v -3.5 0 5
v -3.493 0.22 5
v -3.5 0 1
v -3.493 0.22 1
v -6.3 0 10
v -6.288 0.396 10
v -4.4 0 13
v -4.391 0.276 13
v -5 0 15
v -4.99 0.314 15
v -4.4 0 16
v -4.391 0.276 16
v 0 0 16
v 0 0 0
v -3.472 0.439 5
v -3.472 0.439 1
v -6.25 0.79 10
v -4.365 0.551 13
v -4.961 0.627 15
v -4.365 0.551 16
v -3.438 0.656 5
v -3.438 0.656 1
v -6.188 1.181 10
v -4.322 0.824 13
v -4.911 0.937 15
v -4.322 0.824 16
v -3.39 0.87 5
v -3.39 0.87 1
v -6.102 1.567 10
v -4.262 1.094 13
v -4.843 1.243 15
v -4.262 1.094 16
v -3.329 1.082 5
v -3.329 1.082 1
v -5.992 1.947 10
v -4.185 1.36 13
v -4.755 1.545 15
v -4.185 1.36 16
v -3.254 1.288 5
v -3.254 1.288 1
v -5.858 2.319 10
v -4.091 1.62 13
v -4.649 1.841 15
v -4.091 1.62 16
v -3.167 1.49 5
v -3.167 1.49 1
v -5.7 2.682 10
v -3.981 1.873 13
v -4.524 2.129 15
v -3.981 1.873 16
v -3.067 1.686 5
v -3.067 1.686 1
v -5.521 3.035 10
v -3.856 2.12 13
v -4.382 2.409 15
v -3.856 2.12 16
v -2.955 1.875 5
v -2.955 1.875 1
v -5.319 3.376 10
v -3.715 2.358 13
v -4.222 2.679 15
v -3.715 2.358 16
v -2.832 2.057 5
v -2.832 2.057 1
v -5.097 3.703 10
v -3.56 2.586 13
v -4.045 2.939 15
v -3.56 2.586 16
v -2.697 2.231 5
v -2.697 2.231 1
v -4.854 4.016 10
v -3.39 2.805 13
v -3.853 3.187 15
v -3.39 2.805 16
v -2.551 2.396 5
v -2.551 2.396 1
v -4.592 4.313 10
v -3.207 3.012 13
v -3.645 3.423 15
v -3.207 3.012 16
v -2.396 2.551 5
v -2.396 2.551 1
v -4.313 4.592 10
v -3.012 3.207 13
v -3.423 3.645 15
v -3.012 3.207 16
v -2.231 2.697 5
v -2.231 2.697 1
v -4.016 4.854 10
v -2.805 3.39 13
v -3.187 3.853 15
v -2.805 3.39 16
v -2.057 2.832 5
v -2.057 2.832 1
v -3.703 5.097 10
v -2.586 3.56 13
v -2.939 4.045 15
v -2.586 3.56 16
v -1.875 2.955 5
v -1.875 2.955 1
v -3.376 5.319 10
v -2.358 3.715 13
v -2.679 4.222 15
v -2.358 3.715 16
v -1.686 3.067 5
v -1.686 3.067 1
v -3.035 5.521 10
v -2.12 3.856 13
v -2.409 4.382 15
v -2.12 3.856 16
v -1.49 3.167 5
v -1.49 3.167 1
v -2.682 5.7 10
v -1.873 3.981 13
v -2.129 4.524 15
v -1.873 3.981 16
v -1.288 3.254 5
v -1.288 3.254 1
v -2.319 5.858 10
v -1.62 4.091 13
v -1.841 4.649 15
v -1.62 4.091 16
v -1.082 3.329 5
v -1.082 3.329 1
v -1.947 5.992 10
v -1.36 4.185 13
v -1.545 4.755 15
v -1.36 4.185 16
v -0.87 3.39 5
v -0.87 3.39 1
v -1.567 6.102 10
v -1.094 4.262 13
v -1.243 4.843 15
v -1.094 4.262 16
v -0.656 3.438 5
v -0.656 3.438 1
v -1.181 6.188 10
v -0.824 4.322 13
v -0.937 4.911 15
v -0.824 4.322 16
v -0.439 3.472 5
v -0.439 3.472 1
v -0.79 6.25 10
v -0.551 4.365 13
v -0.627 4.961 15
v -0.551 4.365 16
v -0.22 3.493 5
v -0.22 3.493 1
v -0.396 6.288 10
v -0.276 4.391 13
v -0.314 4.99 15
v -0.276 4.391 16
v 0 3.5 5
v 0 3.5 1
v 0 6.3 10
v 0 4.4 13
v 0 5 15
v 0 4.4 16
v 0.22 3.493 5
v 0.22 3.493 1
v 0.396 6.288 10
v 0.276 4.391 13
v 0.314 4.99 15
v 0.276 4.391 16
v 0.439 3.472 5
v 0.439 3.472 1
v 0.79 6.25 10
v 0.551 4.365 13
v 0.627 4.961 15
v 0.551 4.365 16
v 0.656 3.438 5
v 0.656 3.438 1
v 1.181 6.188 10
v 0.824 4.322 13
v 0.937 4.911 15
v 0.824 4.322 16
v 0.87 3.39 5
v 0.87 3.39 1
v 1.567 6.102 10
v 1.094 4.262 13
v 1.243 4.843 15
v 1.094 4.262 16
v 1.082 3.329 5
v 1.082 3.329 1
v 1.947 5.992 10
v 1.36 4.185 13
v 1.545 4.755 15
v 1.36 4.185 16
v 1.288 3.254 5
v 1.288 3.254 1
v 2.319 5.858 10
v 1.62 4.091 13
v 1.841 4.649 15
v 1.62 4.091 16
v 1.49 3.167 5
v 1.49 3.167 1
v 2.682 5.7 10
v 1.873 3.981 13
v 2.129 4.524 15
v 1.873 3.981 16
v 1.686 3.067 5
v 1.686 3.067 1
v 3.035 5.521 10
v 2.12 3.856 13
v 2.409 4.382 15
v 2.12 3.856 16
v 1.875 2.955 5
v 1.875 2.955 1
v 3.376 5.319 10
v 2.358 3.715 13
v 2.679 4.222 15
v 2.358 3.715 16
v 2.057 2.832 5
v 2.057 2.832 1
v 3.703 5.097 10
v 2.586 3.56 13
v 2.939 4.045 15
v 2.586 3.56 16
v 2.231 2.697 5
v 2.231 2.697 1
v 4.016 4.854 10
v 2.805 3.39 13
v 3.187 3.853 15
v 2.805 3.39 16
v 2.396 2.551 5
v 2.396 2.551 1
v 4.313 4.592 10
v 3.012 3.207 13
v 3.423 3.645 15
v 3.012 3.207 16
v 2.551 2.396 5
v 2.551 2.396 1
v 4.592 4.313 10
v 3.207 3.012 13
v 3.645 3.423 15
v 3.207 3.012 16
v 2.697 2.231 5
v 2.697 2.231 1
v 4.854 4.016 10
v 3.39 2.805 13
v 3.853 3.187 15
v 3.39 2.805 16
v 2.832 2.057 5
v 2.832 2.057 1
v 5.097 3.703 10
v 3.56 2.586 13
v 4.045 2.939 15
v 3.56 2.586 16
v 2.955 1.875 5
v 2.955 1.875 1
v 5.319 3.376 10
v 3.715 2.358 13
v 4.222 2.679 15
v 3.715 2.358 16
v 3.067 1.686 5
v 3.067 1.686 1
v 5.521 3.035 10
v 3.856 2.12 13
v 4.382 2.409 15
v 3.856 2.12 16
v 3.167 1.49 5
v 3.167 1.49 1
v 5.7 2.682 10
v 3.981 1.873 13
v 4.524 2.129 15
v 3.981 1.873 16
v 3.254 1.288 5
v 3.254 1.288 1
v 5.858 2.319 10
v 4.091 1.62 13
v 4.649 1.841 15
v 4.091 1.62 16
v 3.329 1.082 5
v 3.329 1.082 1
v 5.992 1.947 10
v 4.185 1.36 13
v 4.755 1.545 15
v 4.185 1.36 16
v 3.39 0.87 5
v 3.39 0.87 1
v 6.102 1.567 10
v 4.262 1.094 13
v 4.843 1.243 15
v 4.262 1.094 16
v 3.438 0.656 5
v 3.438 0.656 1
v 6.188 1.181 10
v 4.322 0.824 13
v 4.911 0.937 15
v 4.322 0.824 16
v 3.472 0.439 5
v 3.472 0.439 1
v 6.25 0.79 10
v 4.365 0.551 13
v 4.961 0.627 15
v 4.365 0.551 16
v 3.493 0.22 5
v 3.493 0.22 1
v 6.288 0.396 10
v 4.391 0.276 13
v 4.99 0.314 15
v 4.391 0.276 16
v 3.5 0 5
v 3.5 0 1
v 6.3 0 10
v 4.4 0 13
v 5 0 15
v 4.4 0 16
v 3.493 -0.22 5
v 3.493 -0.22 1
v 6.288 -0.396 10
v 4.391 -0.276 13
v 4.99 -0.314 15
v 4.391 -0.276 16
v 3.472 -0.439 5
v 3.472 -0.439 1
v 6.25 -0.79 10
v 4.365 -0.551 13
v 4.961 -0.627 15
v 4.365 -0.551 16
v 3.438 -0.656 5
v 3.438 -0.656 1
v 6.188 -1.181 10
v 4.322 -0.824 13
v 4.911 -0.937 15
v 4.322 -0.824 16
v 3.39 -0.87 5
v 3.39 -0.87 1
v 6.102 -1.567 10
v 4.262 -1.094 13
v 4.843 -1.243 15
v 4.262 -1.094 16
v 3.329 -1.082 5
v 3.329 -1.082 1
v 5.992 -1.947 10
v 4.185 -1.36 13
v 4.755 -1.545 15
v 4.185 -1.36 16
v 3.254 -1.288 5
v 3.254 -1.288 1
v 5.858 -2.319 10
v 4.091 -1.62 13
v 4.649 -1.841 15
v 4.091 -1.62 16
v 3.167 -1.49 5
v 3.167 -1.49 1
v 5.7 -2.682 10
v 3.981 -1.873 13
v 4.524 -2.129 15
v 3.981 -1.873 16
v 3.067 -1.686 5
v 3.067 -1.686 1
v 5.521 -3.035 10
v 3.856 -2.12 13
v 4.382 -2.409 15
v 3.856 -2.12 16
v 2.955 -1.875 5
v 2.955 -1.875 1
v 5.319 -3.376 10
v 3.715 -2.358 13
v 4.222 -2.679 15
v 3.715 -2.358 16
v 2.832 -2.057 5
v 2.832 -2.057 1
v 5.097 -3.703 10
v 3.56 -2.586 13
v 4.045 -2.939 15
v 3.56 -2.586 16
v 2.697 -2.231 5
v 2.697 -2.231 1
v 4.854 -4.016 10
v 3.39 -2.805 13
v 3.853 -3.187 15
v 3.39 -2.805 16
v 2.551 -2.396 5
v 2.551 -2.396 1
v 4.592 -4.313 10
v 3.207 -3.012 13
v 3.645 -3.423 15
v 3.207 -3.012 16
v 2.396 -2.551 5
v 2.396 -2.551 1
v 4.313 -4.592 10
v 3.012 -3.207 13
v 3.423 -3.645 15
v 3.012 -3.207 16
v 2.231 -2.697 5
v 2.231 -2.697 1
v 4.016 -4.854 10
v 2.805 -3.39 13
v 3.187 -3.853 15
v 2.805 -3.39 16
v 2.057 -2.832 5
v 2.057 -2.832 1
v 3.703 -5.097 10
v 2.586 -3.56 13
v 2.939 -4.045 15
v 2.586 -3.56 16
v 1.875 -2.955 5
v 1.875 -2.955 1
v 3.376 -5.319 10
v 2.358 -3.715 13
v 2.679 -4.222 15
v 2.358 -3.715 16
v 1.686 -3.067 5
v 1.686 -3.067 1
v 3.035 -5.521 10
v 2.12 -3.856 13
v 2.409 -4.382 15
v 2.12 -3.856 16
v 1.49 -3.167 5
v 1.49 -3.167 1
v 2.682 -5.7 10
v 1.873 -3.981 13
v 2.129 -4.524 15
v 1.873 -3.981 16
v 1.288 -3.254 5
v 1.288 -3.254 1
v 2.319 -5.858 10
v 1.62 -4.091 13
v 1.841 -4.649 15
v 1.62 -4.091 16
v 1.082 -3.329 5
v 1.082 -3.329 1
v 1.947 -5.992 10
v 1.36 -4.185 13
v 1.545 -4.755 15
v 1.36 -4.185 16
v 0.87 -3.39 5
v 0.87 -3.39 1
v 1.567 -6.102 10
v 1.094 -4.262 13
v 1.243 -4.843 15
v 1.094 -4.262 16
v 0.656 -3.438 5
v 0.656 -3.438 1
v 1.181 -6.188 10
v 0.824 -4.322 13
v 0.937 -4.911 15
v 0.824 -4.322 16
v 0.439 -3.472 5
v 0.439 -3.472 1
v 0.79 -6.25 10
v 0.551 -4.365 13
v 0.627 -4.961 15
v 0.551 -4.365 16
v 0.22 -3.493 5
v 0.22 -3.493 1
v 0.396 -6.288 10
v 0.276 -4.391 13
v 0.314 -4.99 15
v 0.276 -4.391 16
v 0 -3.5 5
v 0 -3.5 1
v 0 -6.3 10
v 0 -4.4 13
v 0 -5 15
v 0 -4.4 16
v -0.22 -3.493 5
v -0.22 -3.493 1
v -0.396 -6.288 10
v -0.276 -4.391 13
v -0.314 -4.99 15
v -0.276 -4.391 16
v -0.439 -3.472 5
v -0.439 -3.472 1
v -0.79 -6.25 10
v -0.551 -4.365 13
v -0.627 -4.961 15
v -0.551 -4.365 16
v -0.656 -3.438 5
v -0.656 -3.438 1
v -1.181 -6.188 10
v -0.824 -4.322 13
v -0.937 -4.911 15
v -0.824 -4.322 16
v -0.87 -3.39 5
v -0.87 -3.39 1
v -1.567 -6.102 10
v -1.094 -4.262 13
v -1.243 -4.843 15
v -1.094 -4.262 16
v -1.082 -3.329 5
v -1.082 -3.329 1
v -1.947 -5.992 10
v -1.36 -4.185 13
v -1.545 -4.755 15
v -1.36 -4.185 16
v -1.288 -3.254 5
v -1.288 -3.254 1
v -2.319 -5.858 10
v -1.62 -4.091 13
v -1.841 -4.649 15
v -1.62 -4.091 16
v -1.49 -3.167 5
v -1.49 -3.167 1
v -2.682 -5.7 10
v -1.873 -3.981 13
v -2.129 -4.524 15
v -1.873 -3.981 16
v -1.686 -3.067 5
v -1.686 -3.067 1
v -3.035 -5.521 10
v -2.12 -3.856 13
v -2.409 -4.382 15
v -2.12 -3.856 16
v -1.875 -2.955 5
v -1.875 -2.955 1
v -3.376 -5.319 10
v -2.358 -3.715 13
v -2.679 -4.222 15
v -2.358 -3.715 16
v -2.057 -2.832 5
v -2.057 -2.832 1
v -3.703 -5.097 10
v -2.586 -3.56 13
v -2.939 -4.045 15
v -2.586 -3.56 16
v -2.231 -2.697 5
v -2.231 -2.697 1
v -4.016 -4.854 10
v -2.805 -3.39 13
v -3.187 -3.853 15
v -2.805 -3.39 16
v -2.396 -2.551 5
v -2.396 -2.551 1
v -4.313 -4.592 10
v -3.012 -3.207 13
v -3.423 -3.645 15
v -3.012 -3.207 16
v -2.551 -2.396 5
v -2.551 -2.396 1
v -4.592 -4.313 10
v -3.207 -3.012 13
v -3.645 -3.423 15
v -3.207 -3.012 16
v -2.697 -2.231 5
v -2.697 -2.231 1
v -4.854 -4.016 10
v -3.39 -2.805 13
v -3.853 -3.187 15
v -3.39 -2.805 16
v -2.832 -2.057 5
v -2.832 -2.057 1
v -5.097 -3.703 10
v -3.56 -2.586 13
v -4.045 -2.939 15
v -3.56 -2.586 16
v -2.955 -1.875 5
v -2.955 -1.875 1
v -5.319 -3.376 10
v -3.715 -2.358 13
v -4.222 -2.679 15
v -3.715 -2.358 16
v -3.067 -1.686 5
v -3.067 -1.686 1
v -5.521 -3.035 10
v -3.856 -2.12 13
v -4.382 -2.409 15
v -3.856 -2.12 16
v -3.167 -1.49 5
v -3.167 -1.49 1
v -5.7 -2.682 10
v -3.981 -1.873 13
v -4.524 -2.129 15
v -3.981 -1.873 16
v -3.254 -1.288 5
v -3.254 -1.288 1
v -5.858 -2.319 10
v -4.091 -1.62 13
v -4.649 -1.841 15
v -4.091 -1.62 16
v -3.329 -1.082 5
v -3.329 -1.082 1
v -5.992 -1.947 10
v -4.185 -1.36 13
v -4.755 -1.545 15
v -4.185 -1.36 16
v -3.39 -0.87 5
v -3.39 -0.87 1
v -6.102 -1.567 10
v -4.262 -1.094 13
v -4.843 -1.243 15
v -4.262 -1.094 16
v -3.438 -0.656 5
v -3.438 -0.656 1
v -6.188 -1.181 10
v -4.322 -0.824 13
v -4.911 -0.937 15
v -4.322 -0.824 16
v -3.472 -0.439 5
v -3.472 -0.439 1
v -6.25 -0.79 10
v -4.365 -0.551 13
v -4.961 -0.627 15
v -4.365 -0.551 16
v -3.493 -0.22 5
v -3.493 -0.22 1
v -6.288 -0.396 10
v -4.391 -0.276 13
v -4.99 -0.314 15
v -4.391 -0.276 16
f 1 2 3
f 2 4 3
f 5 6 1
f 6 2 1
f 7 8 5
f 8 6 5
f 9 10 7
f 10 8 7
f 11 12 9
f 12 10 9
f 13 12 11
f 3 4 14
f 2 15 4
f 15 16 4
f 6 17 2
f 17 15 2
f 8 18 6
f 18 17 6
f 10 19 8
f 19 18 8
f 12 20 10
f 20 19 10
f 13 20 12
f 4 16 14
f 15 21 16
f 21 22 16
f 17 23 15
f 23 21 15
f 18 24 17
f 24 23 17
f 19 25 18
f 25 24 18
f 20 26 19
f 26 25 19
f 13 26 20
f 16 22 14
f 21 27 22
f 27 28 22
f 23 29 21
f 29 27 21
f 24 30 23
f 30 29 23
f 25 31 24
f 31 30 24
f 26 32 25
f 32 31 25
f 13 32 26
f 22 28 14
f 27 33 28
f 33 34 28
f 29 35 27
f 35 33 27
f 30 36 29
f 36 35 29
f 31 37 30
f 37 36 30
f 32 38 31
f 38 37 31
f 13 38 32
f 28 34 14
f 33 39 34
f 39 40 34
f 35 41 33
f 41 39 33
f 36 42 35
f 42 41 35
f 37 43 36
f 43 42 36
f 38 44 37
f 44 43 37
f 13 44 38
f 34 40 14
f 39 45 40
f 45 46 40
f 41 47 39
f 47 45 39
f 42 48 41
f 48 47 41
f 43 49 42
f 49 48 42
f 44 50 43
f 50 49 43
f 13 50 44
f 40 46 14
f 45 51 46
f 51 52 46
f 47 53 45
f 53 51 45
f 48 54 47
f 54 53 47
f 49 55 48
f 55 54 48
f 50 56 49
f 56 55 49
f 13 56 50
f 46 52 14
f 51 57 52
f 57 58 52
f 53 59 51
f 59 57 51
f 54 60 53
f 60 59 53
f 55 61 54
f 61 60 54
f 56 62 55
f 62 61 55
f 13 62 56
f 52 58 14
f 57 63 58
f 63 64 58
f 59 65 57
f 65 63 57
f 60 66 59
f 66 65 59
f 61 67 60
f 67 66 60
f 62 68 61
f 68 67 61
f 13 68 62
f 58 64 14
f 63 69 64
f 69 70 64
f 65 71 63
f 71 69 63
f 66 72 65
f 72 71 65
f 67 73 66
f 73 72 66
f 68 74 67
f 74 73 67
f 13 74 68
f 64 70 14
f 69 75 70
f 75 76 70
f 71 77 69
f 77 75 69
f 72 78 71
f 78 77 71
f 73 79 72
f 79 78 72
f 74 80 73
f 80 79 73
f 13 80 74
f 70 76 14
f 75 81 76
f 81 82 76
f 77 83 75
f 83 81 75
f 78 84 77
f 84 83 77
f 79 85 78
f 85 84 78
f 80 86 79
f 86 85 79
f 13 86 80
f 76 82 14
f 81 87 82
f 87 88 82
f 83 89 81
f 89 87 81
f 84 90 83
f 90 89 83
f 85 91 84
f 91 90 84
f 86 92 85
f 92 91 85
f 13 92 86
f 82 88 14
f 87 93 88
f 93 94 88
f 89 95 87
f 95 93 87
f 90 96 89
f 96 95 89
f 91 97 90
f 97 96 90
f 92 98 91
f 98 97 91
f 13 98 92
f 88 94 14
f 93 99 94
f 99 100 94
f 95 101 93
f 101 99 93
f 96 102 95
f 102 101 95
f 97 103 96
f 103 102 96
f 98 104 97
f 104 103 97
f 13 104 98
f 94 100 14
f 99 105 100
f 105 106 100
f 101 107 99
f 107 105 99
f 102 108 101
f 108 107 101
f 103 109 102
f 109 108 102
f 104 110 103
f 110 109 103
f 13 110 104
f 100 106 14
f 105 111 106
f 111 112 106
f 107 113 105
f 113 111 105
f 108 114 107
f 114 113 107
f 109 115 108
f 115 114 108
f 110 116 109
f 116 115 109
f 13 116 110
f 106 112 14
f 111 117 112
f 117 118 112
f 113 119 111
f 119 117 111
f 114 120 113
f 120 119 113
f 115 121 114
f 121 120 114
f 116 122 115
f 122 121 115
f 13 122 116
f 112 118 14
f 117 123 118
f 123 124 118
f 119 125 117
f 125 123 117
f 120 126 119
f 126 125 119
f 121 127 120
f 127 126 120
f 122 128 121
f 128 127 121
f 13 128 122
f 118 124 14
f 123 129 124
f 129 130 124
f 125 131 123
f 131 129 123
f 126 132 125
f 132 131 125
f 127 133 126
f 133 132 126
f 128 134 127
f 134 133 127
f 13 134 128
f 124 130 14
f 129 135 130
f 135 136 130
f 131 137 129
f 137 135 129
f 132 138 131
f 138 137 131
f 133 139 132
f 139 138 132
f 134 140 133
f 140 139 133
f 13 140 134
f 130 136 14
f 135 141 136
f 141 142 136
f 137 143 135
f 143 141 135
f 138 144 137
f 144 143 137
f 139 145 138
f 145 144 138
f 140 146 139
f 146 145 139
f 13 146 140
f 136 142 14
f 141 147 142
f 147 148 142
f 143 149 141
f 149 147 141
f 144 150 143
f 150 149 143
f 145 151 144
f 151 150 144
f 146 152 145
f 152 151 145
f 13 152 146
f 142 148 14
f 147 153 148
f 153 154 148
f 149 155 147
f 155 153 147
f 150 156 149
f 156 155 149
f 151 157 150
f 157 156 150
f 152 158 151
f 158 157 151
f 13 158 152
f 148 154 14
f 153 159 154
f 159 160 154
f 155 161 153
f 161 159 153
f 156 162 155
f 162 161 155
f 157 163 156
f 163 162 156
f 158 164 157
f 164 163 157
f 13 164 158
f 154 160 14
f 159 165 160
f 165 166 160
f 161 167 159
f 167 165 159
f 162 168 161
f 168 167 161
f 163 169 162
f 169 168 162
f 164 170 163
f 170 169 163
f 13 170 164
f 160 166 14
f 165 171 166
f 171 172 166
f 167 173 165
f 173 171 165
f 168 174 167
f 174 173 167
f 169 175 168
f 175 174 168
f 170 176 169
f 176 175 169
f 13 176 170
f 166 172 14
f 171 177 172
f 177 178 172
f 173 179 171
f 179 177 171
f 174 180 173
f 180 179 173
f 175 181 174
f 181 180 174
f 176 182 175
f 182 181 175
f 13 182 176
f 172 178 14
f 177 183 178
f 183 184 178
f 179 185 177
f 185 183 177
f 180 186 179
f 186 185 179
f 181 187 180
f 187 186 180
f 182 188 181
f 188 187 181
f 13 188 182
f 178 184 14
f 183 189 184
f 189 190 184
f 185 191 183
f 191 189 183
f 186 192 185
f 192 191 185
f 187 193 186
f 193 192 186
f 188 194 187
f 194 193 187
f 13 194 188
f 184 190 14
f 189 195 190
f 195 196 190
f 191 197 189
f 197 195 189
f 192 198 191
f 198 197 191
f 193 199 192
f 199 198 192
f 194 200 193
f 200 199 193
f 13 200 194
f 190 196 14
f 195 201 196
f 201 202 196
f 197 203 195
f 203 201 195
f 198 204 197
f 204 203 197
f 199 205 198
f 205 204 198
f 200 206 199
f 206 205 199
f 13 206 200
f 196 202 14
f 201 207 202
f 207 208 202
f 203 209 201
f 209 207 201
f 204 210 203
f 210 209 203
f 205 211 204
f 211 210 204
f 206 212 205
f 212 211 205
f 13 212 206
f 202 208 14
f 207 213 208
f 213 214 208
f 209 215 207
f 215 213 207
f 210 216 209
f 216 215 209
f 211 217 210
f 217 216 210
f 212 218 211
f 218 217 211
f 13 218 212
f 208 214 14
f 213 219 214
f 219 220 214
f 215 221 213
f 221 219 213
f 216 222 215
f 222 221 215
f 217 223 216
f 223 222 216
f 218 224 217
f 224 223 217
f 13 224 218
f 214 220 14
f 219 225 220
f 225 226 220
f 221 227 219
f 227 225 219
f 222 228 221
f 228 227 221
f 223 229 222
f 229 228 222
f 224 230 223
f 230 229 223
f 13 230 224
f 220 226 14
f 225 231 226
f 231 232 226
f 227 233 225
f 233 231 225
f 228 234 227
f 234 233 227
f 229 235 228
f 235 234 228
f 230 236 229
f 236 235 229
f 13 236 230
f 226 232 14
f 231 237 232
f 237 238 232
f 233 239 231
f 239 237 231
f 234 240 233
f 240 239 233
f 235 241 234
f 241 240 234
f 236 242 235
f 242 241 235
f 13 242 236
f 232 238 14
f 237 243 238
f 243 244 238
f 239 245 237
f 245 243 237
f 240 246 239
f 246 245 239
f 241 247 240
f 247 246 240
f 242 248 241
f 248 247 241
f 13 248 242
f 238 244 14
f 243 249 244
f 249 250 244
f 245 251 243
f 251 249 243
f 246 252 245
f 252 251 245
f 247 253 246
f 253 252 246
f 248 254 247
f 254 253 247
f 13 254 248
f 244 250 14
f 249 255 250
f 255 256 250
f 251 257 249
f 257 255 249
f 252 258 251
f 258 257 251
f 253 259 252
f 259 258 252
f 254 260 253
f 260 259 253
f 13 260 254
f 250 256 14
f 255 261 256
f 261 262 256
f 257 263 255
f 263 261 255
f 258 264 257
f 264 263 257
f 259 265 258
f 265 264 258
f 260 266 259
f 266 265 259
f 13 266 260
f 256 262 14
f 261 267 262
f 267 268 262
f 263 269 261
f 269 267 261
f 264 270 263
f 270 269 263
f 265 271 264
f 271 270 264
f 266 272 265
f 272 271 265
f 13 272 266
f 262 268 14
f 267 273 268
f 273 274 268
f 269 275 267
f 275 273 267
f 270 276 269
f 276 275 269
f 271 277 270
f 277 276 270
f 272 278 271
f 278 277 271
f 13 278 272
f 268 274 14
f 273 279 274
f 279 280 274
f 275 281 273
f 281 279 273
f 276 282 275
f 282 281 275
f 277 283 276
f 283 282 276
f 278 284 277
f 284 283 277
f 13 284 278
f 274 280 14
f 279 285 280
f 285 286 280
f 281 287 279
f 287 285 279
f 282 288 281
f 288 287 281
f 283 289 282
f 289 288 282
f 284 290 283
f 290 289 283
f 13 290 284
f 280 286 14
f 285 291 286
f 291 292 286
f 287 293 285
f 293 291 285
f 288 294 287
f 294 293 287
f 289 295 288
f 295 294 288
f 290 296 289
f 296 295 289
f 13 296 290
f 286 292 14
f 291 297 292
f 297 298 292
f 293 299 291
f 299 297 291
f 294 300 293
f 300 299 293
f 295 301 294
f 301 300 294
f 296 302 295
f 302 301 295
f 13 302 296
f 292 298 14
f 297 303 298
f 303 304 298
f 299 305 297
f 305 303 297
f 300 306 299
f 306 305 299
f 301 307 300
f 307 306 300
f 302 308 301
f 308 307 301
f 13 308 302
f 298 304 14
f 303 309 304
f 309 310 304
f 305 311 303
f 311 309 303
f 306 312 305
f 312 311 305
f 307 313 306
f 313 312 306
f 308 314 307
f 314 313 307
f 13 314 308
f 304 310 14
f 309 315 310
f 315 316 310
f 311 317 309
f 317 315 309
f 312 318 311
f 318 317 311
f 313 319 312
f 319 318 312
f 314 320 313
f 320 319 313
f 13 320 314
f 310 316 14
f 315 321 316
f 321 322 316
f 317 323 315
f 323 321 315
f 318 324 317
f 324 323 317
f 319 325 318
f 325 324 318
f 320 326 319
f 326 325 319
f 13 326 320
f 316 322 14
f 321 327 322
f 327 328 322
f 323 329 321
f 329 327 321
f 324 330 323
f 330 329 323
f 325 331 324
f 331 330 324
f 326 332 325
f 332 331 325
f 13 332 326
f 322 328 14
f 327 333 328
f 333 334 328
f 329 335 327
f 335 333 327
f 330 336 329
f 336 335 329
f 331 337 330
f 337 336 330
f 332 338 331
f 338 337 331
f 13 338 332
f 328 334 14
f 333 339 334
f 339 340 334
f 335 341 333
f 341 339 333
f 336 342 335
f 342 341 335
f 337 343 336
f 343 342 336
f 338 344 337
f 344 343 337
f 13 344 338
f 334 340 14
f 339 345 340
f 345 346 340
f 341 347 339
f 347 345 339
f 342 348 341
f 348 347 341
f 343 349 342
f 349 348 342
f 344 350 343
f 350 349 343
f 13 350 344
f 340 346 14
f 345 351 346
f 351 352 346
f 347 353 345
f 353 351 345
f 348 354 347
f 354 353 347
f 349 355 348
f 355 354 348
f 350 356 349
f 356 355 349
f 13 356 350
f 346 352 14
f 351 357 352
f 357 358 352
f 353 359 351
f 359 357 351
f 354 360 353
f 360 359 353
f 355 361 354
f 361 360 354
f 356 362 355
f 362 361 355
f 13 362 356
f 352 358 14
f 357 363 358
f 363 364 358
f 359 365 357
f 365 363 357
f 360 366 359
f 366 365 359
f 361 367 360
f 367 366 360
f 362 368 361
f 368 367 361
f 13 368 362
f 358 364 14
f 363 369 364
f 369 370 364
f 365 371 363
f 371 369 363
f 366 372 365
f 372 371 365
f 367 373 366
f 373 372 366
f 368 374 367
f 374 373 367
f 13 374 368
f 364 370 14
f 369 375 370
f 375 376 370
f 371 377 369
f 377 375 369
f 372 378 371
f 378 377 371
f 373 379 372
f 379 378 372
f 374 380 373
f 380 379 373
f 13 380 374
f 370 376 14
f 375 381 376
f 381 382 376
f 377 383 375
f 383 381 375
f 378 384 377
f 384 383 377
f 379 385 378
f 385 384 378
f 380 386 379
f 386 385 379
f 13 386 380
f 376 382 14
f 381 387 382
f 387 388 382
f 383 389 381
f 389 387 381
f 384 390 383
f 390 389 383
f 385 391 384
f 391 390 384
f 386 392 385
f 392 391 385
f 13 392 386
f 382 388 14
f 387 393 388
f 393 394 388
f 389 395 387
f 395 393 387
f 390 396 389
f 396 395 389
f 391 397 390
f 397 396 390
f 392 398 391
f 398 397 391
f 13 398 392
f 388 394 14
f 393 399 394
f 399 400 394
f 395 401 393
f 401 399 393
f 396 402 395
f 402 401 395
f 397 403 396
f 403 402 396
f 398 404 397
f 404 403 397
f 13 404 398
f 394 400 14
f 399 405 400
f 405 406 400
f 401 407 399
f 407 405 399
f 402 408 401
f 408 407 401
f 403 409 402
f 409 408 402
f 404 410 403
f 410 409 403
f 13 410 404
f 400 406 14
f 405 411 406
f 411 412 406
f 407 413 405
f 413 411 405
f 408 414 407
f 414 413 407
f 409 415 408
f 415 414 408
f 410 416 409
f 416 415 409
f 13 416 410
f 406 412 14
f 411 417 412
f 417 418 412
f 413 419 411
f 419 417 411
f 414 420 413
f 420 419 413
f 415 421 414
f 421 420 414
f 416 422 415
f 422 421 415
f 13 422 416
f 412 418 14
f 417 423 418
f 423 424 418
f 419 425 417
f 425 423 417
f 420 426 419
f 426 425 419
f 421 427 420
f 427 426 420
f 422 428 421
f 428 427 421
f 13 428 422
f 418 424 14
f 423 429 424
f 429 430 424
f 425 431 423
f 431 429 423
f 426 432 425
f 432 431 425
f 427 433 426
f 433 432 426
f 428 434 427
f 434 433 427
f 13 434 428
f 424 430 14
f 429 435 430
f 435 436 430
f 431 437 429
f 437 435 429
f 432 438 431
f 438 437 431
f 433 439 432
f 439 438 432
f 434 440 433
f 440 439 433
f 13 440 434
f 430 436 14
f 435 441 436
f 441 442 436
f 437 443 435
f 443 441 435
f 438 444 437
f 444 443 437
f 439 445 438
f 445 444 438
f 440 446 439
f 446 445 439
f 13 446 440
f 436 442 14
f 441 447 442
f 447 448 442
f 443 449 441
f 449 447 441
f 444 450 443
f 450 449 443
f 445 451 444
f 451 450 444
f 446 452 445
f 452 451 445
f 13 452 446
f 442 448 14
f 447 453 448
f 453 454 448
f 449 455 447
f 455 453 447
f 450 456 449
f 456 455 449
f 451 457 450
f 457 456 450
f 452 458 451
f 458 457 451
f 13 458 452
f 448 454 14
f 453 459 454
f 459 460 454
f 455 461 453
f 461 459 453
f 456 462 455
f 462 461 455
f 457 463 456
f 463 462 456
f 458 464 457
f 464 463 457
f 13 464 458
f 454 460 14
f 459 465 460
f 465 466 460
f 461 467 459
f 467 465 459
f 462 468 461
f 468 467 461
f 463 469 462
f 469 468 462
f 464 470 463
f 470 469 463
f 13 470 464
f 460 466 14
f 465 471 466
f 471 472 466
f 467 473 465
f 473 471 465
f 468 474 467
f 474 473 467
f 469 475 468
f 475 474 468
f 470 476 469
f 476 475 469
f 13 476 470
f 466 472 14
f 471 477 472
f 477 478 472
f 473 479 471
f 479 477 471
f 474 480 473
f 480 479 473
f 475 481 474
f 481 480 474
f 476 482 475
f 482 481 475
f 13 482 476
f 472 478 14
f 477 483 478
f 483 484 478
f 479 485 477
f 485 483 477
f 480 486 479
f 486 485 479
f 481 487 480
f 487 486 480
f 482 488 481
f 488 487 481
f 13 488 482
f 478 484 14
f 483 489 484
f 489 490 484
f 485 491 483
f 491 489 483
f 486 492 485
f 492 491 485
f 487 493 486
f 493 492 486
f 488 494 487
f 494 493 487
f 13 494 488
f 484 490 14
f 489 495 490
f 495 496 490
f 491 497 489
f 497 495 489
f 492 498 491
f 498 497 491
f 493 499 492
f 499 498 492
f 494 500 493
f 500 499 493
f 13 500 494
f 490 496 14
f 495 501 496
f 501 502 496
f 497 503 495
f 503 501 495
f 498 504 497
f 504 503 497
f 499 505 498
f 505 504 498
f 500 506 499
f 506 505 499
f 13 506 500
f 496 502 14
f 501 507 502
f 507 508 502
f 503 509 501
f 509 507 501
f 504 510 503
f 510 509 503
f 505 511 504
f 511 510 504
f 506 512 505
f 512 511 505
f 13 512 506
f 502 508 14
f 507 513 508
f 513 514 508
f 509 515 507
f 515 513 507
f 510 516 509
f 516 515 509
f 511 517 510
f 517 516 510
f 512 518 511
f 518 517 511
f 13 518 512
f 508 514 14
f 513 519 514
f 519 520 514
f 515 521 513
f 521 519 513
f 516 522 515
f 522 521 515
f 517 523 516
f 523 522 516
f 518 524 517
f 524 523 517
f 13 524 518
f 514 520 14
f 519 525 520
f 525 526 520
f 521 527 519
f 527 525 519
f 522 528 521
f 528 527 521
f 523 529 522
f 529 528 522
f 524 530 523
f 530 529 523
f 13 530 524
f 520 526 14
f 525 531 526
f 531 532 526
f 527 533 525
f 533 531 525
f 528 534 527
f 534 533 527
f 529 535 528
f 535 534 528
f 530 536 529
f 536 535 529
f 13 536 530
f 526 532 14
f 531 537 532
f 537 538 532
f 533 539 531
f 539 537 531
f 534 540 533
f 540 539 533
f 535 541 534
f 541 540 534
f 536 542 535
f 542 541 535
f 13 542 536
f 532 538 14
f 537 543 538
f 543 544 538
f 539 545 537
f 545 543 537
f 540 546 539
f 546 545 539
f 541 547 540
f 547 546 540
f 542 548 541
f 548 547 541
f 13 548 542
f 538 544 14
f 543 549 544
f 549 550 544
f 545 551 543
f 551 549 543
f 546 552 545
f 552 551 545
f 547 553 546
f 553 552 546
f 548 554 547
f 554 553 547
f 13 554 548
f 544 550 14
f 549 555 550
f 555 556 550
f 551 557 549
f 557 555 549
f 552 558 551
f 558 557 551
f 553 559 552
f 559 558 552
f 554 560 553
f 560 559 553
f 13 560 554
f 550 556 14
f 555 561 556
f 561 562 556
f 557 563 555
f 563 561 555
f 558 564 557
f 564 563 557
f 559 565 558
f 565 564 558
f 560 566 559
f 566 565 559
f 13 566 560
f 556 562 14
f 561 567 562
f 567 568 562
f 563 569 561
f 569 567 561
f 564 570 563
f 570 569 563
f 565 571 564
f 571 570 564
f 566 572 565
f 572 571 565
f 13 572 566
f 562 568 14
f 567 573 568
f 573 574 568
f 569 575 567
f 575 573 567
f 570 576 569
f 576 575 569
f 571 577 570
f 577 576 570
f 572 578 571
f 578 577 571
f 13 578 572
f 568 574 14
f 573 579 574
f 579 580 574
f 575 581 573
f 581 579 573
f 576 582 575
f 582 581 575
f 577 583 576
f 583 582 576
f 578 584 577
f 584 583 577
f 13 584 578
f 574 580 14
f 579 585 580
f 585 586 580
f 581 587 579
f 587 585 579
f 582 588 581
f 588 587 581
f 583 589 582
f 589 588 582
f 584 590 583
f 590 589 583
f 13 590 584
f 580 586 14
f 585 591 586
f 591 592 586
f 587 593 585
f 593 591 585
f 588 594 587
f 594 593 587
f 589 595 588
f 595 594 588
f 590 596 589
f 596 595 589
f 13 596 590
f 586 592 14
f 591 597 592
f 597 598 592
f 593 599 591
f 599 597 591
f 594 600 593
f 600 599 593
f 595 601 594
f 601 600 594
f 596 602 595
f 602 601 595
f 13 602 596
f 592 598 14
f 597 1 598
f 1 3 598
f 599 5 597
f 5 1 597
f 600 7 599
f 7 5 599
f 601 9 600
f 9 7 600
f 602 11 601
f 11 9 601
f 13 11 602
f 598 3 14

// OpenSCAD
rotate_extrude($fn=100) 
polygon( points=[[0,0],
[3.5,1],
[3.5,5],
[6.3,10],
[4.4,13],
[5,15],
[4.4,16],
[0,16],] );
